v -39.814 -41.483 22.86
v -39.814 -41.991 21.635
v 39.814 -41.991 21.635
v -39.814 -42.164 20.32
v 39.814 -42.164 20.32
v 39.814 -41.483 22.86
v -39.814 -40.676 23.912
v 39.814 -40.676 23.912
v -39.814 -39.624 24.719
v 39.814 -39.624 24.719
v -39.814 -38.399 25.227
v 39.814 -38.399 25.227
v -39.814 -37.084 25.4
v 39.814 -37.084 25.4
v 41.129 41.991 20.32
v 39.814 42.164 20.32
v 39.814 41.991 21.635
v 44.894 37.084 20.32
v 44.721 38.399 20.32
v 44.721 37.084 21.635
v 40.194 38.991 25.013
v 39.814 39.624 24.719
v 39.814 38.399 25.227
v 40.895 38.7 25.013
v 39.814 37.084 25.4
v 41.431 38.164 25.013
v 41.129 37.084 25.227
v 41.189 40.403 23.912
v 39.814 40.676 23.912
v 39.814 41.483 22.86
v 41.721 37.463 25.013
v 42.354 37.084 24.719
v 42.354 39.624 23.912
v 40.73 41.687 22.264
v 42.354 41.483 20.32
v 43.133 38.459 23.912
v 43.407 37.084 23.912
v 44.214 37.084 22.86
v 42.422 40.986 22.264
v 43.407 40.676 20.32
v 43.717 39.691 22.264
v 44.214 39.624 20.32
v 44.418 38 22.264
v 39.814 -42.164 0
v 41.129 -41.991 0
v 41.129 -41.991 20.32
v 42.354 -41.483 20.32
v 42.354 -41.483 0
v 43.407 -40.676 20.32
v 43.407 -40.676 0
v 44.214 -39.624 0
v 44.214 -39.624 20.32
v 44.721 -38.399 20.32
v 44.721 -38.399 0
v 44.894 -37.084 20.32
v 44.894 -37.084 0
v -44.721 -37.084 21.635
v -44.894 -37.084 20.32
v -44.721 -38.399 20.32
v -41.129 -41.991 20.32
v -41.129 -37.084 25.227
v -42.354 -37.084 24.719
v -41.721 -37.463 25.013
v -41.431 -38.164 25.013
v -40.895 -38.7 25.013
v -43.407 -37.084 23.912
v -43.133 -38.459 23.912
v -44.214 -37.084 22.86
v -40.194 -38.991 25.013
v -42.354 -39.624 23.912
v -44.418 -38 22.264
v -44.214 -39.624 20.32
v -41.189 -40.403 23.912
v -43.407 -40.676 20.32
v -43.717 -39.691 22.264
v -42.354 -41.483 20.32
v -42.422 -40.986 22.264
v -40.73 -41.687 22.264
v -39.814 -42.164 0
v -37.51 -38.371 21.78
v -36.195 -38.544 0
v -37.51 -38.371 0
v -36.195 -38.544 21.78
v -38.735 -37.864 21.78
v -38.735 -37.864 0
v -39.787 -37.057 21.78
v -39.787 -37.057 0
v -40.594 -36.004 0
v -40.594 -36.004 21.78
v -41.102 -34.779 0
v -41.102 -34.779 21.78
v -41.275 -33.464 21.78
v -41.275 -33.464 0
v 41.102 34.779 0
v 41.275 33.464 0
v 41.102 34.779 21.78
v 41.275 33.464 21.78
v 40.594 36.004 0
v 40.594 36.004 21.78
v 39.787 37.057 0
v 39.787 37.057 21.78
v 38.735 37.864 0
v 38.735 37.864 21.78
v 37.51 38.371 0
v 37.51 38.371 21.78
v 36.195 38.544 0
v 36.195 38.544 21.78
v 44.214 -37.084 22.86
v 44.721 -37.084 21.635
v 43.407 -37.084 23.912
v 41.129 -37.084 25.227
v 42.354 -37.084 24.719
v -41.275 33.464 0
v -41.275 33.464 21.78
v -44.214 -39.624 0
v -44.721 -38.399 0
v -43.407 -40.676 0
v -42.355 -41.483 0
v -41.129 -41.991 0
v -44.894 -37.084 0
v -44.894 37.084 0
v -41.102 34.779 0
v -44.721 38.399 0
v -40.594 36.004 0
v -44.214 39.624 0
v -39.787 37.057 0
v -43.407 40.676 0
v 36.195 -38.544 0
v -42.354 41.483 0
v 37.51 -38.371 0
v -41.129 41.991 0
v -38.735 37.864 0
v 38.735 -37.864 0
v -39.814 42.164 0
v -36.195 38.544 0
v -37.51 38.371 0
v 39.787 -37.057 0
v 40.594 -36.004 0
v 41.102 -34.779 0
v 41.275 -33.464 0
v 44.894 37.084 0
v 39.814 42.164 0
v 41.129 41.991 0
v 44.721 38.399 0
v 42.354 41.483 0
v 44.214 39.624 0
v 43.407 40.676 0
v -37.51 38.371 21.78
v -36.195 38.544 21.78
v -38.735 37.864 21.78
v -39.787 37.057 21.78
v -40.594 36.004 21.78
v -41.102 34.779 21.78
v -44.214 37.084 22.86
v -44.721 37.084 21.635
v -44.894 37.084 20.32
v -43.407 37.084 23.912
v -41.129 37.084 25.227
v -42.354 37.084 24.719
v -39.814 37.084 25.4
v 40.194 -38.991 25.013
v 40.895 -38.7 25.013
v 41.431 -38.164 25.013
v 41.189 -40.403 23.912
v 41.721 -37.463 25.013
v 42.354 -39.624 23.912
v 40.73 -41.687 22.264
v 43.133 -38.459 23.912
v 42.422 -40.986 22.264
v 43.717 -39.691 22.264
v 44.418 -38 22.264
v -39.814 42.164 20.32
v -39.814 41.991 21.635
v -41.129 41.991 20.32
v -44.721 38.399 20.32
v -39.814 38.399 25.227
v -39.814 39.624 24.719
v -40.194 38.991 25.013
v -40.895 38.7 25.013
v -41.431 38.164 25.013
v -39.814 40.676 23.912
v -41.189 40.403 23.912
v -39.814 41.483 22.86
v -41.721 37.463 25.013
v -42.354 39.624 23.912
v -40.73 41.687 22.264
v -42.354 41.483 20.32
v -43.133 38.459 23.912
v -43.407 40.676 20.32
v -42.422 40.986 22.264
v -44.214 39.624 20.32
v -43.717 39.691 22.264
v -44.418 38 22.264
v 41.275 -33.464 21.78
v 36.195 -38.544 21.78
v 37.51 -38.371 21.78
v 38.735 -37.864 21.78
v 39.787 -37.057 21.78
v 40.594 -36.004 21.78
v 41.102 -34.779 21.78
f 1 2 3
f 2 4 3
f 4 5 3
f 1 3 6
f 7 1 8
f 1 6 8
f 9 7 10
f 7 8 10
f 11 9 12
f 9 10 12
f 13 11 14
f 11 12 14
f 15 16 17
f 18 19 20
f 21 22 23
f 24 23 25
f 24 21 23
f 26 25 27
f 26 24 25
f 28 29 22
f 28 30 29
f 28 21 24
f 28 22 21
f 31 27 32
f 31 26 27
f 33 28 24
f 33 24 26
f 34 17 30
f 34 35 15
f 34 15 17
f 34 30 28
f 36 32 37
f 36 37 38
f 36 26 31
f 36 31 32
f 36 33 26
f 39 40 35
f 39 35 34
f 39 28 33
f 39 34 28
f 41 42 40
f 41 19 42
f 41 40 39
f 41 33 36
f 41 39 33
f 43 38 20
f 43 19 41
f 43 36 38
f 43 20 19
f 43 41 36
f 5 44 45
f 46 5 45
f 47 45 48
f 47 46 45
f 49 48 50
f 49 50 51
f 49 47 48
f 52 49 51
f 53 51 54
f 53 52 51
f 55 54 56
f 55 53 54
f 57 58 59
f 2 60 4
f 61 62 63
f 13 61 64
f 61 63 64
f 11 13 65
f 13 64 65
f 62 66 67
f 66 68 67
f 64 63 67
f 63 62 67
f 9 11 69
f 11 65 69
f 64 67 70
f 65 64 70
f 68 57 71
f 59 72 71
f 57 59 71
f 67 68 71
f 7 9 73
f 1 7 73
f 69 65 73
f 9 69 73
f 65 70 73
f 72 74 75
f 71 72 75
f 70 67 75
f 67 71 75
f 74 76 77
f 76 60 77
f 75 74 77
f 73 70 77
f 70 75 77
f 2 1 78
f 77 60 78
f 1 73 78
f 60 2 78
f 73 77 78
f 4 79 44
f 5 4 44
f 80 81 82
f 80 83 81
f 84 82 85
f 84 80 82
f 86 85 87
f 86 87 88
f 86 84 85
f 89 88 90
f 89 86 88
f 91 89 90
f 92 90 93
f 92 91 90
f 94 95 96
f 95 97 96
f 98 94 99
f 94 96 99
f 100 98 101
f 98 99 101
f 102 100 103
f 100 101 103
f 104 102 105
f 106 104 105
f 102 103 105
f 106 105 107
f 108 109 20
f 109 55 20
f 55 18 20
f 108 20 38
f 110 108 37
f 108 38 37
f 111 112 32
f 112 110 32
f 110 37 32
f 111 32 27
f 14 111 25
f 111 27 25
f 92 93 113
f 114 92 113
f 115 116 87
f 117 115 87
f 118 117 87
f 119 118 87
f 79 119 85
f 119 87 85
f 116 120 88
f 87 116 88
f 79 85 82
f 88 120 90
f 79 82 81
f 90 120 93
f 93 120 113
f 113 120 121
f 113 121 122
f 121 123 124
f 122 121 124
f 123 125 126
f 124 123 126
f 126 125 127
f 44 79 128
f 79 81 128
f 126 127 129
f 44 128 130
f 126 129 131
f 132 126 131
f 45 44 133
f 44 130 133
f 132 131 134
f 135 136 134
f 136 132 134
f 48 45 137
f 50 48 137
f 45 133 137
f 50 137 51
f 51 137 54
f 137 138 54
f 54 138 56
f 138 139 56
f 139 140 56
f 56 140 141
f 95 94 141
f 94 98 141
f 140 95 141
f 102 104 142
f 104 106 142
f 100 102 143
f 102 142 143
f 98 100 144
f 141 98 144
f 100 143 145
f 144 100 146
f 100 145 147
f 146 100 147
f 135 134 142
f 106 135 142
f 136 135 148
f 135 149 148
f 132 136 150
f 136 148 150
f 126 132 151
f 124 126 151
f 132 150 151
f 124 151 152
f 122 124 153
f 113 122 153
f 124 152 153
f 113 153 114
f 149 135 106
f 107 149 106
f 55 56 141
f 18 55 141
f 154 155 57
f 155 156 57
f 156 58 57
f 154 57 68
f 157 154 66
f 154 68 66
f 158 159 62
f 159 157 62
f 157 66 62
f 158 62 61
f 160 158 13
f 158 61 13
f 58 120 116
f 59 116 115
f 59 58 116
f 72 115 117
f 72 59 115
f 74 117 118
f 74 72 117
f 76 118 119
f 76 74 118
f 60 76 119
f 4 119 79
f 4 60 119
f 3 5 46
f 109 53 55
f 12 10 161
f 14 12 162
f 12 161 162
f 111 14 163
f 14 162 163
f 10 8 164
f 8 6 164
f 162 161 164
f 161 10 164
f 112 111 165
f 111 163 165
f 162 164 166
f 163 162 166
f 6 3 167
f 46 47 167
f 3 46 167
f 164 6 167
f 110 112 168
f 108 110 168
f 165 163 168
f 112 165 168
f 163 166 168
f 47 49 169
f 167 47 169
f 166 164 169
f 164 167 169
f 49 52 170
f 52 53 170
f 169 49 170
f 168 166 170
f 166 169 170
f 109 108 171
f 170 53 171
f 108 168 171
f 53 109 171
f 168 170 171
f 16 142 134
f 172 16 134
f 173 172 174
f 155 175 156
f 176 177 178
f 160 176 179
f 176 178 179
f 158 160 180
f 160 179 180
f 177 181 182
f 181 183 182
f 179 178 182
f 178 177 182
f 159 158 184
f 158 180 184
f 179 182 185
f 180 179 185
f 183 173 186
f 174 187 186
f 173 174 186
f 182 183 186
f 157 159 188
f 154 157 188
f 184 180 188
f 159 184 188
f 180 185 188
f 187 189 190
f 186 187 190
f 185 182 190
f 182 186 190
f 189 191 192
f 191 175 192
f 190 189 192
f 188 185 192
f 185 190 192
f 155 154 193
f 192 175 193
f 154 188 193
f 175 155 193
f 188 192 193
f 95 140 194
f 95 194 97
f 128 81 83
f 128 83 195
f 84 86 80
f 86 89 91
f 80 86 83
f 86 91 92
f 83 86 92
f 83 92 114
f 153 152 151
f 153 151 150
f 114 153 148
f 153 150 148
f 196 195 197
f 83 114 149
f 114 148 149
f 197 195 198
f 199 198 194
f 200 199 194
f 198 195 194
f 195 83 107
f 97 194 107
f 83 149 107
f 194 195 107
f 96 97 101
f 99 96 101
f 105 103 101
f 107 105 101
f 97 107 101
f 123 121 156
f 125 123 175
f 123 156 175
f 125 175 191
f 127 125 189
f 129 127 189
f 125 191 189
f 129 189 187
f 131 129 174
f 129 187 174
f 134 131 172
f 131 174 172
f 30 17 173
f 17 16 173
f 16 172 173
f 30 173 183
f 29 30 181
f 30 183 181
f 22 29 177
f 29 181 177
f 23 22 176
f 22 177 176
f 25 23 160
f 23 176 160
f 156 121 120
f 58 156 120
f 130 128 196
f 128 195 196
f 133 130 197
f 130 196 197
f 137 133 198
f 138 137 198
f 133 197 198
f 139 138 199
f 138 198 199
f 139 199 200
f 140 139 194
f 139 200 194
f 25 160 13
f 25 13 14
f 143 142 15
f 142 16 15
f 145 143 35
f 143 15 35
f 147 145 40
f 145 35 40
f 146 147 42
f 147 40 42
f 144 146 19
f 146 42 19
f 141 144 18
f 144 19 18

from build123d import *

# Parameters (mm, degrees)
F0_W     = 82.55
F0_H     = 77.089
F1_DEPTH = 25.4
F2_W     = 82.55
F2_H     = 77.089
F3_DEPTH = 3.6195
F4_R     = 5.08
F5_R     = 5.08


with BuildPart() as f1:
    # F0 (on Top) → F1 (new body)
    with BuildSketch(Plane.XY):
        Polygon((-44.8945, 42.164), (-44.8945, 38.5445), (-44.8945, -42.164), (44.8945, -42.164), (44.8945, 42.164), align=None)
        Rectangle(F0_W, F0_H, mode=Mode.SUBTRACT)
    extrude(amount=F1_DEPTH)

    # F2 (on face) → F3 (join)
    with BuildSketch(Plane.XY.offset(25.4)):
        Rectangle(F2_W, F2_H)
    extrude(amount=-F3_DEPTH)

    # F4
    f4_edges = [f1.edges().sort_by_distance(p)[0] for p in [
        (41.275, -38.5445, 10.89025),
        (-41.275, -38.5445, 10.89025),
        (41.275, 38.5445, 10.89025),
        (-41.275, 38.5445, 10.89025),
    ]]
    fillet(f4_edges, radius=F4_R)

    # F5
    f5_edges = [f1.edges().sort_by_distance(p)[0] for p in [
        (-44.8945, -42.164, 12.7),
        (44.8945, -42.164, 12.7),
        (44.8945, 42.164, 12.7),
        (-44.8945, 42.164, 12.7),
        (0, 42.164, 25.4),
        (-44.8945, 0, 25.4),
        (0, -42.164, 25.4),
        (44.8945, 0, 25.4),
    ]]
    fillet(f5_edges, radius=F5_R)


solid = f1.part
